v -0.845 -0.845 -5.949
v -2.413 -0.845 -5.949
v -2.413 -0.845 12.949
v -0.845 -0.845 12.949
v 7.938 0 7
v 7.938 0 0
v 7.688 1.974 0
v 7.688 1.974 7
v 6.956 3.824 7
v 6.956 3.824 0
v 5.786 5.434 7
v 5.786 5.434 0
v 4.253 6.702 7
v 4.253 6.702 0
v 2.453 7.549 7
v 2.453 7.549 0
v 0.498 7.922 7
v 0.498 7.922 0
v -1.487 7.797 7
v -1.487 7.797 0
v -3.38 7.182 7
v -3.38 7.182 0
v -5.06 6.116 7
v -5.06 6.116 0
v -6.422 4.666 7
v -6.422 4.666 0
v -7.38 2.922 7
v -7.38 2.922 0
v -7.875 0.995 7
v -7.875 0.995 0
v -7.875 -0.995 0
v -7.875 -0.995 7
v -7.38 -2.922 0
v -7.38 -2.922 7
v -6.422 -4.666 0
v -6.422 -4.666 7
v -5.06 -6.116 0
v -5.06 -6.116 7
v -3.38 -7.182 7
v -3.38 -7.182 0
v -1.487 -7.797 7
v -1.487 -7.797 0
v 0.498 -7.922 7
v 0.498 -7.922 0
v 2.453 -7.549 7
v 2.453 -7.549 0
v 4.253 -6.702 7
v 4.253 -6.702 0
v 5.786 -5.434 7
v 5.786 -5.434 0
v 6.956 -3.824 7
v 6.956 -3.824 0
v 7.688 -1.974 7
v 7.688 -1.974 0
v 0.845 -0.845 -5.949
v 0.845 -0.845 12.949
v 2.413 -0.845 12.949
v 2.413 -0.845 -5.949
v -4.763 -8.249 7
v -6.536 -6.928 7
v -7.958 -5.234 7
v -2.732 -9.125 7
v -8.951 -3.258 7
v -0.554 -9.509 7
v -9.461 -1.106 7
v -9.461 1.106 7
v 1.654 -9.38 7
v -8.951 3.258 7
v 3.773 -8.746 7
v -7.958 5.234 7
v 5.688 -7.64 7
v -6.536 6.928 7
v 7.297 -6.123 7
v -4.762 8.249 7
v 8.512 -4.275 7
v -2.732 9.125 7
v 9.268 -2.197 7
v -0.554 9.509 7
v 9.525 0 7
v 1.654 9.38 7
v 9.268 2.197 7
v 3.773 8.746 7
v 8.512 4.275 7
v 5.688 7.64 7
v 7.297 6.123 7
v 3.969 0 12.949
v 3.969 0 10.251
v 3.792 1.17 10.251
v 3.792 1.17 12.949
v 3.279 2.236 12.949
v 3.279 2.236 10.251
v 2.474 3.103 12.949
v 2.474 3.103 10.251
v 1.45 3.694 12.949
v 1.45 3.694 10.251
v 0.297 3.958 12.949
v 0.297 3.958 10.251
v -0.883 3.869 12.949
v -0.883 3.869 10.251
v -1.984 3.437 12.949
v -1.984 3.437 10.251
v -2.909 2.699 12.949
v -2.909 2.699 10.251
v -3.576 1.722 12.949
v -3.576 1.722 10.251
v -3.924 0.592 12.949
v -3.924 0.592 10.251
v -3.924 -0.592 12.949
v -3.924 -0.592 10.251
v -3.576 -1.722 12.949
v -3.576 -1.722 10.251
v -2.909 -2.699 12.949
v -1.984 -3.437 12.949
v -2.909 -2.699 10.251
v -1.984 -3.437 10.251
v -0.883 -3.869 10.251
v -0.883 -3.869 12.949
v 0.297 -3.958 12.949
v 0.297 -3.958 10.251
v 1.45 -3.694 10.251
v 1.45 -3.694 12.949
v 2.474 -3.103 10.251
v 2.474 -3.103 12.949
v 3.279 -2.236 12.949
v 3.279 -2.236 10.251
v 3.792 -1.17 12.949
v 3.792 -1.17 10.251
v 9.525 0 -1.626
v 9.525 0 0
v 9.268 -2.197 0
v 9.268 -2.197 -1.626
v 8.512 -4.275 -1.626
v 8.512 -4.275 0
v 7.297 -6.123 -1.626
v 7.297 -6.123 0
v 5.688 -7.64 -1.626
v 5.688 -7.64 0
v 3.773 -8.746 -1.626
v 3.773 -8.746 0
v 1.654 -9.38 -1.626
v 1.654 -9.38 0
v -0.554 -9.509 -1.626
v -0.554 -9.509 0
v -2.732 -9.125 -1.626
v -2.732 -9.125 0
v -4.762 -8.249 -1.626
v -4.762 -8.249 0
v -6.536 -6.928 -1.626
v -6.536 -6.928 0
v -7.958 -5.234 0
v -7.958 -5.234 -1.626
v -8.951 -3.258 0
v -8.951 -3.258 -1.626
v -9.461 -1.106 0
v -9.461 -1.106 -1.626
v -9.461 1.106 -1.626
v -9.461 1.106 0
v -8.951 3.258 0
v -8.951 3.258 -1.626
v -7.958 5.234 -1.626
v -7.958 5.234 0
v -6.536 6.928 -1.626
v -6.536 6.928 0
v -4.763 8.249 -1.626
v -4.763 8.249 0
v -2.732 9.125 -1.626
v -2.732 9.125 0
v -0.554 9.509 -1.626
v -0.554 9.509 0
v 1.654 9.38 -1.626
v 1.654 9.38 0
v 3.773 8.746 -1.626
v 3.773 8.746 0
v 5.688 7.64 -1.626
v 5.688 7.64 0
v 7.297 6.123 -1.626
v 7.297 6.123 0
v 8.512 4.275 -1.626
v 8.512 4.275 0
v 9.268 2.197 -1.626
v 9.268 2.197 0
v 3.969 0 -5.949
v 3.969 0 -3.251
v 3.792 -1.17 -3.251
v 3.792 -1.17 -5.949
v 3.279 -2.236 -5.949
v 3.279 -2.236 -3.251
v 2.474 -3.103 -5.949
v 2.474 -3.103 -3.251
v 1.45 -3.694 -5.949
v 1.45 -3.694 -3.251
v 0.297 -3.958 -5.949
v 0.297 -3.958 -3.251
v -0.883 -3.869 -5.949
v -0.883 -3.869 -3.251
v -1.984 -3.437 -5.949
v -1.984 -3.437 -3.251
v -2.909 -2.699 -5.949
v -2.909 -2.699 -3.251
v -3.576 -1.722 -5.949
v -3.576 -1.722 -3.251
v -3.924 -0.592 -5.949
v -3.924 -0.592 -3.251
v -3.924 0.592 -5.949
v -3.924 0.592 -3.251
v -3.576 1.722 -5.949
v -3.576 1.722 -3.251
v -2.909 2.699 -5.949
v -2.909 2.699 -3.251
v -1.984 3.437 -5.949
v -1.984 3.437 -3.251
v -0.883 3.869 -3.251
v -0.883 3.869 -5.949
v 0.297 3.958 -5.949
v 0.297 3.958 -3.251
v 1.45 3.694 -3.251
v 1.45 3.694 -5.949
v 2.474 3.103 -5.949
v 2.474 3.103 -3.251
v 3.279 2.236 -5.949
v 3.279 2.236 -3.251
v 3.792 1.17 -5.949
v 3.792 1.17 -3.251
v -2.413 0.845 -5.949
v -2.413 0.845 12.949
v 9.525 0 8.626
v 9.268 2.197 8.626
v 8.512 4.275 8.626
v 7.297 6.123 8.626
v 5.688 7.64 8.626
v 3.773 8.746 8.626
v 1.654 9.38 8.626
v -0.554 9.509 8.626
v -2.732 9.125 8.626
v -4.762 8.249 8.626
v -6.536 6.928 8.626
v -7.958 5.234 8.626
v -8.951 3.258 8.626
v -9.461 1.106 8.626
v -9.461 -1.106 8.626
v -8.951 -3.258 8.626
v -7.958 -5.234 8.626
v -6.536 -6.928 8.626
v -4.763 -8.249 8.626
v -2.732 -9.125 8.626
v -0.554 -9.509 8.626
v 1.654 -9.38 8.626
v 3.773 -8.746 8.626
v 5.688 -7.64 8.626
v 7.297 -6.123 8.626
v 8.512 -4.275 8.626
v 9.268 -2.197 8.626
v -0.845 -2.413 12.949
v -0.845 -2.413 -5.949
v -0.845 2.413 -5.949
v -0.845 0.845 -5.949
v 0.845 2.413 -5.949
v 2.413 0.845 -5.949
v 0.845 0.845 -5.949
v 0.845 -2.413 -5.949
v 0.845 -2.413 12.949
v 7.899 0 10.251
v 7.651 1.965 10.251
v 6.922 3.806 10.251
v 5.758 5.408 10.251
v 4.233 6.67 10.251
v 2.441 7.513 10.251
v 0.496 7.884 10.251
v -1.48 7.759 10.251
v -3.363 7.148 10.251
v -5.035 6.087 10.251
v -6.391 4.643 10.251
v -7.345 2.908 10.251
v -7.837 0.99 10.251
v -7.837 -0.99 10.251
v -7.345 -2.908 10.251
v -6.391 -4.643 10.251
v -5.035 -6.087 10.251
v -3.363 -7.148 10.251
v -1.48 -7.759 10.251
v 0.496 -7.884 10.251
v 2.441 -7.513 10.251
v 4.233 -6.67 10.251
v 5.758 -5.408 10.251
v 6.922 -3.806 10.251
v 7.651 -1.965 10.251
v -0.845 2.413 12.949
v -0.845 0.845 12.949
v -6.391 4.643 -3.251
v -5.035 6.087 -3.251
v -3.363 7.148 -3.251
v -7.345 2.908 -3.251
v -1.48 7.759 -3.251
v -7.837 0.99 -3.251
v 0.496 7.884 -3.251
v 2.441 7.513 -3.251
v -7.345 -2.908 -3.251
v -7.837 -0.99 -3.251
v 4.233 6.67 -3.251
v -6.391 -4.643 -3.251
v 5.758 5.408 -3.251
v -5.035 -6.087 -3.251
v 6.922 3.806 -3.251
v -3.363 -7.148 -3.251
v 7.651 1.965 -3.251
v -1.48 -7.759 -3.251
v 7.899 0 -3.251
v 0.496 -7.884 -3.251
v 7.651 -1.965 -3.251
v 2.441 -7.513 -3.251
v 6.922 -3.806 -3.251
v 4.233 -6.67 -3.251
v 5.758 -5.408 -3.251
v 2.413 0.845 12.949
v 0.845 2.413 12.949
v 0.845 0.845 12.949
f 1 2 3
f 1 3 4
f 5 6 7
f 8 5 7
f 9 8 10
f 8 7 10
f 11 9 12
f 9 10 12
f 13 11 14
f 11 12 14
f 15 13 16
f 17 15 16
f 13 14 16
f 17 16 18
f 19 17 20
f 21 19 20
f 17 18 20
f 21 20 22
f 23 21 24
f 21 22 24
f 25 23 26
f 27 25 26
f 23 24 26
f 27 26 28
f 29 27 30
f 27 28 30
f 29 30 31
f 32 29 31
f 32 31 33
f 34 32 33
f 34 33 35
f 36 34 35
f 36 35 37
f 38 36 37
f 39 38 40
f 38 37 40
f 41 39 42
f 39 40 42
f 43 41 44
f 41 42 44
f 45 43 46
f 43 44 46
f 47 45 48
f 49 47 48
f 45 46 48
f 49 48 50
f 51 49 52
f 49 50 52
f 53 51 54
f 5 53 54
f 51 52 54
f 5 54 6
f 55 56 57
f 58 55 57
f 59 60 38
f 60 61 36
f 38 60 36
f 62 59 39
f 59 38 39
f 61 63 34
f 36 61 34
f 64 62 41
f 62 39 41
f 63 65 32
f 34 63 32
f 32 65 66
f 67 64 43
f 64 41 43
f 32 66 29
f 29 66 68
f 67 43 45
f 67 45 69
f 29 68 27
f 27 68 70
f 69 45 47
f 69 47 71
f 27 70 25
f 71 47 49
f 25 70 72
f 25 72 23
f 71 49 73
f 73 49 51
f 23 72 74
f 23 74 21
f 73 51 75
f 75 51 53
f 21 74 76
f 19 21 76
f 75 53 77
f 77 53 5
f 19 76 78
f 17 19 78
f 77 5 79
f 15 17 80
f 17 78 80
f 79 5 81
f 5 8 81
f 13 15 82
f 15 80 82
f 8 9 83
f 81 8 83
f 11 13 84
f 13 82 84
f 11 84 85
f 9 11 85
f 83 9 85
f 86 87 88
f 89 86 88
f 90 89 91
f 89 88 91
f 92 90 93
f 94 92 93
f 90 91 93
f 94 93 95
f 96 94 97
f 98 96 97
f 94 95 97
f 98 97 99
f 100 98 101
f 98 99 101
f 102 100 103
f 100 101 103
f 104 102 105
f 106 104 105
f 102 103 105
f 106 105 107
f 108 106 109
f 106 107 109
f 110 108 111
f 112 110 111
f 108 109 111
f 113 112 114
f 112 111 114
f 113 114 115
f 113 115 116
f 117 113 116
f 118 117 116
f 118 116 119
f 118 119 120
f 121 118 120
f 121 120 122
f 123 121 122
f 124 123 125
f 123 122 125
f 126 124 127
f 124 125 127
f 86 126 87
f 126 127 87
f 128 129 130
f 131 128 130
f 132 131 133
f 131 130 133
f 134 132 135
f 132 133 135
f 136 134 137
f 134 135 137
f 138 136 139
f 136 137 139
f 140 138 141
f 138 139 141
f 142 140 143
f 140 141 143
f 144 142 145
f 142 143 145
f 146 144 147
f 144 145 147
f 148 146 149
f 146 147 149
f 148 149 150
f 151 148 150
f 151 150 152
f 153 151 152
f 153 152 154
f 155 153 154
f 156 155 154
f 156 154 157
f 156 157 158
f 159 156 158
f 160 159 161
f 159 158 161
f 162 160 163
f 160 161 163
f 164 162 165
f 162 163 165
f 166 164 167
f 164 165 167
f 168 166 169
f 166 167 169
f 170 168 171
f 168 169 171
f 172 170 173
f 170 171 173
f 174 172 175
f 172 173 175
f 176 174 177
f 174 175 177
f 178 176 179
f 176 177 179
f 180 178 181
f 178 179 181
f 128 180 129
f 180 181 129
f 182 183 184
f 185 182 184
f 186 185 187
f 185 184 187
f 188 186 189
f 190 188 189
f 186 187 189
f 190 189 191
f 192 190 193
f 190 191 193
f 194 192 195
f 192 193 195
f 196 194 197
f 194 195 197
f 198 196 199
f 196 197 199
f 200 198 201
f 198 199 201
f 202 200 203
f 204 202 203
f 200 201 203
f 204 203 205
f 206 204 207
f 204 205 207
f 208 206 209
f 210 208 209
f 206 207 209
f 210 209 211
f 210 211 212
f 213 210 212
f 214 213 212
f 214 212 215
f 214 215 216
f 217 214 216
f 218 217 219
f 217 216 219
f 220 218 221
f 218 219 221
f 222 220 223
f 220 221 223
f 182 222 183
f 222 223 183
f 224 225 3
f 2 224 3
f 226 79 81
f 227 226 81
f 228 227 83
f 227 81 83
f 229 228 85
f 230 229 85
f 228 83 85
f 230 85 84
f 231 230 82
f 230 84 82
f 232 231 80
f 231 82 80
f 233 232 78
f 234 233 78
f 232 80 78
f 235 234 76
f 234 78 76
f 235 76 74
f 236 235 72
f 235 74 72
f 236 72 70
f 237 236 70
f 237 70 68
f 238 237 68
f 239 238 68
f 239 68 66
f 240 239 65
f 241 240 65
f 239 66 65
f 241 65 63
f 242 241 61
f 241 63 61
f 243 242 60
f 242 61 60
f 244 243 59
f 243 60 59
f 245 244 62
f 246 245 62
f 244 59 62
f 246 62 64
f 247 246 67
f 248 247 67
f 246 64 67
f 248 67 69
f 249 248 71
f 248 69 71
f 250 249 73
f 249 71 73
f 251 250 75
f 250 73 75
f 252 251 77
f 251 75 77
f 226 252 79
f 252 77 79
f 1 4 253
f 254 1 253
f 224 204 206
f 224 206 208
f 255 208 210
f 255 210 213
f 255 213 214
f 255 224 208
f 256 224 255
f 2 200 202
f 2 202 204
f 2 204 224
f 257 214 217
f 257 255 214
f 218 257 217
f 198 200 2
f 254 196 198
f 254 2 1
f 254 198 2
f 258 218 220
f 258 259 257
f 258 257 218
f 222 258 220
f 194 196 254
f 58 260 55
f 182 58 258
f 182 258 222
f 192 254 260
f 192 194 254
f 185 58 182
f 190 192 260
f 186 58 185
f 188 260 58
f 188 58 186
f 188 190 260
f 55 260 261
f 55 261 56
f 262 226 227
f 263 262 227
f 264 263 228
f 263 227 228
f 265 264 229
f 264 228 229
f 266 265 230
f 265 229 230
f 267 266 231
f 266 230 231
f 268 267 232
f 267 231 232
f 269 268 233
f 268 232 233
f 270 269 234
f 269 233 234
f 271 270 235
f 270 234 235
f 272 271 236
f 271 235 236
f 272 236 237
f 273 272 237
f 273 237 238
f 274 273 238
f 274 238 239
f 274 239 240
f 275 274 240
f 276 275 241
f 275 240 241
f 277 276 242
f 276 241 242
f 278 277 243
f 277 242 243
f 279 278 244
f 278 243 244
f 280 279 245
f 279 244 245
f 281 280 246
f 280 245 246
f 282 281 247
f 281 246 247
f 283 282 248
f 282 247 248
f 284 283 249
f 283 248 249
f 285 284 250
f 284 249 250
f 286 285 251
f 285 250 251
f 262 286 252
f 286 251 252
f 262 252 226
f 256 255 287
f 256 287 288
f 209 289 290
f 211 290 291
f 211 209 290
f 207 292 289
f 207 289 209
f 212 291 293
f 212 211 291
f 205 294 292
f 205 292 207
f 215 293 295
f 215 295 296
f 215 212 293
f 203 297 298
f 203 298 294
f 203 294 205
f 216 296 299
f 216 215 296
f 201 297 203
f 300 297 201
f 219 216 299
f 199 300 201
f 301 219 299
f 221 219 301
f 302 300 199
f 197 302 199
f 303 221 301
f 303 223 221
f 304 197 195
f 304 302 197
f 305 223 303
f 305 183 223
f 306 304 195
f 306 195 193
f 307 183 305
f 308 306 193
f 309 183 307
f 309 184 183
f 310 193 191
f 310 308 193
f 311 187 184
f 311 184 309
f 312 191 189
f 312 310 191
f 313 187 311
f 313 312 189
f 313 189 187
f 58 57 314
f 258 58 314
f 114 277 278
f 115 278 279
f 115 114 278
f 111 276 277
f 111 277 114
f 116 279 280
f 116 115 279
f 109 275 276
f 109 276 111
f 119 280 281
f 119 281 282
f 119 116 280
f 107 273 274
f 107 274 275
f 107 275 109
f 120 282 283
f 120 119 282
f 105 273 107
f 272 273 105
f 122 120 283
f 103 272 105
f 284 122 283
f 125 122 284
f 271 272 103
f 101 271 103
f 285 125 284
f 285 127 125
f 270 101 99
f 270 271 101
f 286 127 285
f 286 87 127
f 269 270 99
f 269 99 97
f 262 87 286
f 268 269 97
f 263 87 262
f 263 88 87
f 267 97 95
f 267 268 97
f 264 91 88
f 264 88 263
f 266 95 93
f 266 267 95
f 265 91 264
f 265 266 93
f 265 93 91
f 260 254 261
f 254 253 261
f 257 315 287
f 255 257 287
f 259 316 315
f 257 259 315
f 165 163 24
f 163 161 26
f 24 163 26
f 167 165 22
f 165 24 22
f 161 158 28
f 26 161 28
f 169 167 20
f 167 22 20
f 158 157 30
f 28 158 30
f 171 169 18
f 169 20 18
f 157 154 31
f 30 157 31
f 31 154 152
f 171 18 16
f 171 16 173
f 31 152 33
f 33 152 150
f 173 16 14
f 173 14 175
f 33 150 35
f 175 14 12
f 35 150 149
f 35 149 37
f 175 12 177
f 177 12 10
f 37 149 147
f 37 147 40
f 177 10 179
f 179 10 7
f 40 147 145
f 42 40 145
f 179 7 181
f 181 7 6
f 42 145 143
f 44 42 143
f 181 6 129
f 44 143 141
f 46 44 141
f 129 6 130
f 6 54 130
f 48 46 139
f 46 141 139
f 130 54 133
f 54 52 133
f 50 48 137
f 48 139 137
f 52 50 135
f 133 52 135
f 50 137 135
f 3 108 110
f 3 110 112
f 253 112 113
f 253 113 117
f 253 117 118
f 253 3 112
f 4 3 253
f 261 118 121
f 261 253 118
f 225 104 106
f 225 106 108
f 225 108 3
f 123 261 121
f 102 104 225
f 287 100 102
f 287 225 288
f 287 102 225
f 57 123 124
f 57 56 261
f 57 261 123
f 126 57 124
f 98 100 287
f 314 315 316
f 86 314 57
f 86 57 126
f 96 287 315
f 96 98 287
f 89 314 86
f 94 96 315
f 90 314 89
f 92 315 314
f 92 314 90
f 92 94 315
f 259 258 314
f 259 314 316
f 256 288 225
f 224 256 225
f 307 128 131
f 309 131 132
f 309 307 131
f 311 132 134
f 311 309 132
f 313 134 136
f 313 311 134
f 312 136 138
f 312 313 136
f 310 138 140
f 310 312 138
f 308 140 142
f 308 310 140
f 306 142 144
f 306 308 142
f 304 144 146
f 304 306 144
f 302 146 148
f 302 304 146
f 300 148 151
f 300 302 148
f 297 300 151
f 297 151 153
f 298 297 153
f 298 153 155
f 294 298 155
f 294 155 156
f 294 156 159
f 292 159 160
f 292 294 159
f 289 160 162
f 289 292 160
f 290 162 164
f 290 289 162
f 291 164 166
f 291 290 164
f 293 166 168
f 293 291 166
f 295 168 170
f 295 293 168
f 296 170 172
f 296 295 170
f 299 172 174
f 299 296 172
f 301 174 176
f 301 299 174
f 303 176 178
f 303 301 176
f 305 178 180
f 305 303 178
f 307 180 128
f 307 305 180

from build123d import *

# Parameters (mm, degrees)
F0_R      = 7.9375
F1_DEPTH  = 7
F2_R      = 9.525
F2_R_2    = 7.9375
F3_DEPTH  = 3.2512
F4_R      = 9.525
F4_R_2    = 7.9375
F5_DEPTH  = 3.2512
F6_SIZE   = 1.6256
F7_R      = 3.96875
F8_DEPTH  = 2.6975943
F9_R      = 3.96875
F10_DEPTH = 2.6975943


with BuildPart() as f1:
    # F0 (on Top) → F1 (new body)
    with BuildSketch(Plane.XY):
        Circle(F0_R)
        Polygon((0.84455, 0.84455), (2.413, 0.84455), (2.413, -0.84455), (0.84455, -0.84455), (0.84455, -2.413), (-0.84455, -2.413), (-0.84455, -0.84455), (-2.413, -0.84455), (-2.413, 0.84455), (-0.84455, 0.84455), (-0.84455, 2.413), (0.84455, 2.413), align=None, mode=Mode.SUBTRACT)
    extrude(amount=F1_DEPTH)

    # F2 (on face) → F3 (join)
    with BuildSketch(Plane.XY.offset(7)):
        Circle(F2_R)
        Circle(F2_R_2, mode=Mode.SUBTRACT)
        Circle(F2_R_2)
        Polygon((0.84455, 2.413), (0.84455, 0.84455), (2.413, 0.84455), (2.413, -0.84455), (0.84455, -0.84455), (0.84455, -2.413), (-0.84455, -2.413), (-0.84455, -0.84455), (-2.413, -0.84455), (-2.413, 0.84455), (-0.84455, 0.84455), (-0.84455, 2.413), align=None, mode=Mode.SUBTRACT)
    extrude(amount=F3_DEPTH)

    # F4 (on face) → F5 (join)
    with BuildSketch(Plane(origin=(0, 0, 0), x_dir=(1, 0, 0), z_dir=(0, 0, -1))):
        Circle(F4_R)
        Circle(F4_R_2, mode=Mode.SUBTRACT)
        Circle(F4_R_2)
        Polygon((2.413, 0.84455), (2.413, -0.84455), (0.84455, -0.84455), (0.84455, -2.413), (-0.84455, -2.413), (-0.84455, -0.84455), (-2.413, -0.84455), (-2.413, 0.84455), (-0.84455, 0.84455), (-0.84455, 2.413), (0.84455, 2.413), (0.84455, 0.84455), align=None, mode=Mode.SUBTRACT)
    extrude(amount=F5_DEPTH)

    # F6
    f6_edges = [f1.edges().sort_by_distance(p)[0] for p in [
        (-9.525, 0, 10.2512),
        (-9.525, 0, -3.2512),
    ]]
    chamfer(f6_edges, length=F6_SIZE)

    # F7 (on face) → F8 (join)
    with BuildSketch(Plane.XY.offset(10.2512)):
        Circle(F7_R)
        Polygon((-2.413, -0.84455), (-2.413, 0.84455), (-0.84455, 0.84455), (-0.84455, 2.413), (0.84455, 2.413), (0.84455, 0.84455), (2.413, 0.84455), (2.413, -0.84455), (0.84455, -0.84455), (0.84455, -2.413), (-0.84455, -2.413), (-0.84455, -0.84455), align=None, mode=Mode.SUBTRACT)
    extrude(amount=F8_DEPTH)

    # F9 (on face) → F10 (join)
    with BuildSketch(Plane(origin=(0, 0, -3.2512), x_dir=(1, 0, 0), z_dir=(0, 0, -1))):
        Circle(F9_R)
        Polygon((-0.84455, 2.413), (0.84455, 2.413), (0.84455, 0.84455), (2.413, 0.84455), (2.413, -0.84455), (0.84455, -0.84455), (0.84455, -2.413), (-0.84455, -2.413), (-0.84455, -0.84455), (-2.413, -0.84455), (-2.413, 0.84455), (-0.84455, 0.84455), align=None, mode=Mode.SUBTRACT)
    extrude(amount=F10_DEPTH)


solid = f1.part
